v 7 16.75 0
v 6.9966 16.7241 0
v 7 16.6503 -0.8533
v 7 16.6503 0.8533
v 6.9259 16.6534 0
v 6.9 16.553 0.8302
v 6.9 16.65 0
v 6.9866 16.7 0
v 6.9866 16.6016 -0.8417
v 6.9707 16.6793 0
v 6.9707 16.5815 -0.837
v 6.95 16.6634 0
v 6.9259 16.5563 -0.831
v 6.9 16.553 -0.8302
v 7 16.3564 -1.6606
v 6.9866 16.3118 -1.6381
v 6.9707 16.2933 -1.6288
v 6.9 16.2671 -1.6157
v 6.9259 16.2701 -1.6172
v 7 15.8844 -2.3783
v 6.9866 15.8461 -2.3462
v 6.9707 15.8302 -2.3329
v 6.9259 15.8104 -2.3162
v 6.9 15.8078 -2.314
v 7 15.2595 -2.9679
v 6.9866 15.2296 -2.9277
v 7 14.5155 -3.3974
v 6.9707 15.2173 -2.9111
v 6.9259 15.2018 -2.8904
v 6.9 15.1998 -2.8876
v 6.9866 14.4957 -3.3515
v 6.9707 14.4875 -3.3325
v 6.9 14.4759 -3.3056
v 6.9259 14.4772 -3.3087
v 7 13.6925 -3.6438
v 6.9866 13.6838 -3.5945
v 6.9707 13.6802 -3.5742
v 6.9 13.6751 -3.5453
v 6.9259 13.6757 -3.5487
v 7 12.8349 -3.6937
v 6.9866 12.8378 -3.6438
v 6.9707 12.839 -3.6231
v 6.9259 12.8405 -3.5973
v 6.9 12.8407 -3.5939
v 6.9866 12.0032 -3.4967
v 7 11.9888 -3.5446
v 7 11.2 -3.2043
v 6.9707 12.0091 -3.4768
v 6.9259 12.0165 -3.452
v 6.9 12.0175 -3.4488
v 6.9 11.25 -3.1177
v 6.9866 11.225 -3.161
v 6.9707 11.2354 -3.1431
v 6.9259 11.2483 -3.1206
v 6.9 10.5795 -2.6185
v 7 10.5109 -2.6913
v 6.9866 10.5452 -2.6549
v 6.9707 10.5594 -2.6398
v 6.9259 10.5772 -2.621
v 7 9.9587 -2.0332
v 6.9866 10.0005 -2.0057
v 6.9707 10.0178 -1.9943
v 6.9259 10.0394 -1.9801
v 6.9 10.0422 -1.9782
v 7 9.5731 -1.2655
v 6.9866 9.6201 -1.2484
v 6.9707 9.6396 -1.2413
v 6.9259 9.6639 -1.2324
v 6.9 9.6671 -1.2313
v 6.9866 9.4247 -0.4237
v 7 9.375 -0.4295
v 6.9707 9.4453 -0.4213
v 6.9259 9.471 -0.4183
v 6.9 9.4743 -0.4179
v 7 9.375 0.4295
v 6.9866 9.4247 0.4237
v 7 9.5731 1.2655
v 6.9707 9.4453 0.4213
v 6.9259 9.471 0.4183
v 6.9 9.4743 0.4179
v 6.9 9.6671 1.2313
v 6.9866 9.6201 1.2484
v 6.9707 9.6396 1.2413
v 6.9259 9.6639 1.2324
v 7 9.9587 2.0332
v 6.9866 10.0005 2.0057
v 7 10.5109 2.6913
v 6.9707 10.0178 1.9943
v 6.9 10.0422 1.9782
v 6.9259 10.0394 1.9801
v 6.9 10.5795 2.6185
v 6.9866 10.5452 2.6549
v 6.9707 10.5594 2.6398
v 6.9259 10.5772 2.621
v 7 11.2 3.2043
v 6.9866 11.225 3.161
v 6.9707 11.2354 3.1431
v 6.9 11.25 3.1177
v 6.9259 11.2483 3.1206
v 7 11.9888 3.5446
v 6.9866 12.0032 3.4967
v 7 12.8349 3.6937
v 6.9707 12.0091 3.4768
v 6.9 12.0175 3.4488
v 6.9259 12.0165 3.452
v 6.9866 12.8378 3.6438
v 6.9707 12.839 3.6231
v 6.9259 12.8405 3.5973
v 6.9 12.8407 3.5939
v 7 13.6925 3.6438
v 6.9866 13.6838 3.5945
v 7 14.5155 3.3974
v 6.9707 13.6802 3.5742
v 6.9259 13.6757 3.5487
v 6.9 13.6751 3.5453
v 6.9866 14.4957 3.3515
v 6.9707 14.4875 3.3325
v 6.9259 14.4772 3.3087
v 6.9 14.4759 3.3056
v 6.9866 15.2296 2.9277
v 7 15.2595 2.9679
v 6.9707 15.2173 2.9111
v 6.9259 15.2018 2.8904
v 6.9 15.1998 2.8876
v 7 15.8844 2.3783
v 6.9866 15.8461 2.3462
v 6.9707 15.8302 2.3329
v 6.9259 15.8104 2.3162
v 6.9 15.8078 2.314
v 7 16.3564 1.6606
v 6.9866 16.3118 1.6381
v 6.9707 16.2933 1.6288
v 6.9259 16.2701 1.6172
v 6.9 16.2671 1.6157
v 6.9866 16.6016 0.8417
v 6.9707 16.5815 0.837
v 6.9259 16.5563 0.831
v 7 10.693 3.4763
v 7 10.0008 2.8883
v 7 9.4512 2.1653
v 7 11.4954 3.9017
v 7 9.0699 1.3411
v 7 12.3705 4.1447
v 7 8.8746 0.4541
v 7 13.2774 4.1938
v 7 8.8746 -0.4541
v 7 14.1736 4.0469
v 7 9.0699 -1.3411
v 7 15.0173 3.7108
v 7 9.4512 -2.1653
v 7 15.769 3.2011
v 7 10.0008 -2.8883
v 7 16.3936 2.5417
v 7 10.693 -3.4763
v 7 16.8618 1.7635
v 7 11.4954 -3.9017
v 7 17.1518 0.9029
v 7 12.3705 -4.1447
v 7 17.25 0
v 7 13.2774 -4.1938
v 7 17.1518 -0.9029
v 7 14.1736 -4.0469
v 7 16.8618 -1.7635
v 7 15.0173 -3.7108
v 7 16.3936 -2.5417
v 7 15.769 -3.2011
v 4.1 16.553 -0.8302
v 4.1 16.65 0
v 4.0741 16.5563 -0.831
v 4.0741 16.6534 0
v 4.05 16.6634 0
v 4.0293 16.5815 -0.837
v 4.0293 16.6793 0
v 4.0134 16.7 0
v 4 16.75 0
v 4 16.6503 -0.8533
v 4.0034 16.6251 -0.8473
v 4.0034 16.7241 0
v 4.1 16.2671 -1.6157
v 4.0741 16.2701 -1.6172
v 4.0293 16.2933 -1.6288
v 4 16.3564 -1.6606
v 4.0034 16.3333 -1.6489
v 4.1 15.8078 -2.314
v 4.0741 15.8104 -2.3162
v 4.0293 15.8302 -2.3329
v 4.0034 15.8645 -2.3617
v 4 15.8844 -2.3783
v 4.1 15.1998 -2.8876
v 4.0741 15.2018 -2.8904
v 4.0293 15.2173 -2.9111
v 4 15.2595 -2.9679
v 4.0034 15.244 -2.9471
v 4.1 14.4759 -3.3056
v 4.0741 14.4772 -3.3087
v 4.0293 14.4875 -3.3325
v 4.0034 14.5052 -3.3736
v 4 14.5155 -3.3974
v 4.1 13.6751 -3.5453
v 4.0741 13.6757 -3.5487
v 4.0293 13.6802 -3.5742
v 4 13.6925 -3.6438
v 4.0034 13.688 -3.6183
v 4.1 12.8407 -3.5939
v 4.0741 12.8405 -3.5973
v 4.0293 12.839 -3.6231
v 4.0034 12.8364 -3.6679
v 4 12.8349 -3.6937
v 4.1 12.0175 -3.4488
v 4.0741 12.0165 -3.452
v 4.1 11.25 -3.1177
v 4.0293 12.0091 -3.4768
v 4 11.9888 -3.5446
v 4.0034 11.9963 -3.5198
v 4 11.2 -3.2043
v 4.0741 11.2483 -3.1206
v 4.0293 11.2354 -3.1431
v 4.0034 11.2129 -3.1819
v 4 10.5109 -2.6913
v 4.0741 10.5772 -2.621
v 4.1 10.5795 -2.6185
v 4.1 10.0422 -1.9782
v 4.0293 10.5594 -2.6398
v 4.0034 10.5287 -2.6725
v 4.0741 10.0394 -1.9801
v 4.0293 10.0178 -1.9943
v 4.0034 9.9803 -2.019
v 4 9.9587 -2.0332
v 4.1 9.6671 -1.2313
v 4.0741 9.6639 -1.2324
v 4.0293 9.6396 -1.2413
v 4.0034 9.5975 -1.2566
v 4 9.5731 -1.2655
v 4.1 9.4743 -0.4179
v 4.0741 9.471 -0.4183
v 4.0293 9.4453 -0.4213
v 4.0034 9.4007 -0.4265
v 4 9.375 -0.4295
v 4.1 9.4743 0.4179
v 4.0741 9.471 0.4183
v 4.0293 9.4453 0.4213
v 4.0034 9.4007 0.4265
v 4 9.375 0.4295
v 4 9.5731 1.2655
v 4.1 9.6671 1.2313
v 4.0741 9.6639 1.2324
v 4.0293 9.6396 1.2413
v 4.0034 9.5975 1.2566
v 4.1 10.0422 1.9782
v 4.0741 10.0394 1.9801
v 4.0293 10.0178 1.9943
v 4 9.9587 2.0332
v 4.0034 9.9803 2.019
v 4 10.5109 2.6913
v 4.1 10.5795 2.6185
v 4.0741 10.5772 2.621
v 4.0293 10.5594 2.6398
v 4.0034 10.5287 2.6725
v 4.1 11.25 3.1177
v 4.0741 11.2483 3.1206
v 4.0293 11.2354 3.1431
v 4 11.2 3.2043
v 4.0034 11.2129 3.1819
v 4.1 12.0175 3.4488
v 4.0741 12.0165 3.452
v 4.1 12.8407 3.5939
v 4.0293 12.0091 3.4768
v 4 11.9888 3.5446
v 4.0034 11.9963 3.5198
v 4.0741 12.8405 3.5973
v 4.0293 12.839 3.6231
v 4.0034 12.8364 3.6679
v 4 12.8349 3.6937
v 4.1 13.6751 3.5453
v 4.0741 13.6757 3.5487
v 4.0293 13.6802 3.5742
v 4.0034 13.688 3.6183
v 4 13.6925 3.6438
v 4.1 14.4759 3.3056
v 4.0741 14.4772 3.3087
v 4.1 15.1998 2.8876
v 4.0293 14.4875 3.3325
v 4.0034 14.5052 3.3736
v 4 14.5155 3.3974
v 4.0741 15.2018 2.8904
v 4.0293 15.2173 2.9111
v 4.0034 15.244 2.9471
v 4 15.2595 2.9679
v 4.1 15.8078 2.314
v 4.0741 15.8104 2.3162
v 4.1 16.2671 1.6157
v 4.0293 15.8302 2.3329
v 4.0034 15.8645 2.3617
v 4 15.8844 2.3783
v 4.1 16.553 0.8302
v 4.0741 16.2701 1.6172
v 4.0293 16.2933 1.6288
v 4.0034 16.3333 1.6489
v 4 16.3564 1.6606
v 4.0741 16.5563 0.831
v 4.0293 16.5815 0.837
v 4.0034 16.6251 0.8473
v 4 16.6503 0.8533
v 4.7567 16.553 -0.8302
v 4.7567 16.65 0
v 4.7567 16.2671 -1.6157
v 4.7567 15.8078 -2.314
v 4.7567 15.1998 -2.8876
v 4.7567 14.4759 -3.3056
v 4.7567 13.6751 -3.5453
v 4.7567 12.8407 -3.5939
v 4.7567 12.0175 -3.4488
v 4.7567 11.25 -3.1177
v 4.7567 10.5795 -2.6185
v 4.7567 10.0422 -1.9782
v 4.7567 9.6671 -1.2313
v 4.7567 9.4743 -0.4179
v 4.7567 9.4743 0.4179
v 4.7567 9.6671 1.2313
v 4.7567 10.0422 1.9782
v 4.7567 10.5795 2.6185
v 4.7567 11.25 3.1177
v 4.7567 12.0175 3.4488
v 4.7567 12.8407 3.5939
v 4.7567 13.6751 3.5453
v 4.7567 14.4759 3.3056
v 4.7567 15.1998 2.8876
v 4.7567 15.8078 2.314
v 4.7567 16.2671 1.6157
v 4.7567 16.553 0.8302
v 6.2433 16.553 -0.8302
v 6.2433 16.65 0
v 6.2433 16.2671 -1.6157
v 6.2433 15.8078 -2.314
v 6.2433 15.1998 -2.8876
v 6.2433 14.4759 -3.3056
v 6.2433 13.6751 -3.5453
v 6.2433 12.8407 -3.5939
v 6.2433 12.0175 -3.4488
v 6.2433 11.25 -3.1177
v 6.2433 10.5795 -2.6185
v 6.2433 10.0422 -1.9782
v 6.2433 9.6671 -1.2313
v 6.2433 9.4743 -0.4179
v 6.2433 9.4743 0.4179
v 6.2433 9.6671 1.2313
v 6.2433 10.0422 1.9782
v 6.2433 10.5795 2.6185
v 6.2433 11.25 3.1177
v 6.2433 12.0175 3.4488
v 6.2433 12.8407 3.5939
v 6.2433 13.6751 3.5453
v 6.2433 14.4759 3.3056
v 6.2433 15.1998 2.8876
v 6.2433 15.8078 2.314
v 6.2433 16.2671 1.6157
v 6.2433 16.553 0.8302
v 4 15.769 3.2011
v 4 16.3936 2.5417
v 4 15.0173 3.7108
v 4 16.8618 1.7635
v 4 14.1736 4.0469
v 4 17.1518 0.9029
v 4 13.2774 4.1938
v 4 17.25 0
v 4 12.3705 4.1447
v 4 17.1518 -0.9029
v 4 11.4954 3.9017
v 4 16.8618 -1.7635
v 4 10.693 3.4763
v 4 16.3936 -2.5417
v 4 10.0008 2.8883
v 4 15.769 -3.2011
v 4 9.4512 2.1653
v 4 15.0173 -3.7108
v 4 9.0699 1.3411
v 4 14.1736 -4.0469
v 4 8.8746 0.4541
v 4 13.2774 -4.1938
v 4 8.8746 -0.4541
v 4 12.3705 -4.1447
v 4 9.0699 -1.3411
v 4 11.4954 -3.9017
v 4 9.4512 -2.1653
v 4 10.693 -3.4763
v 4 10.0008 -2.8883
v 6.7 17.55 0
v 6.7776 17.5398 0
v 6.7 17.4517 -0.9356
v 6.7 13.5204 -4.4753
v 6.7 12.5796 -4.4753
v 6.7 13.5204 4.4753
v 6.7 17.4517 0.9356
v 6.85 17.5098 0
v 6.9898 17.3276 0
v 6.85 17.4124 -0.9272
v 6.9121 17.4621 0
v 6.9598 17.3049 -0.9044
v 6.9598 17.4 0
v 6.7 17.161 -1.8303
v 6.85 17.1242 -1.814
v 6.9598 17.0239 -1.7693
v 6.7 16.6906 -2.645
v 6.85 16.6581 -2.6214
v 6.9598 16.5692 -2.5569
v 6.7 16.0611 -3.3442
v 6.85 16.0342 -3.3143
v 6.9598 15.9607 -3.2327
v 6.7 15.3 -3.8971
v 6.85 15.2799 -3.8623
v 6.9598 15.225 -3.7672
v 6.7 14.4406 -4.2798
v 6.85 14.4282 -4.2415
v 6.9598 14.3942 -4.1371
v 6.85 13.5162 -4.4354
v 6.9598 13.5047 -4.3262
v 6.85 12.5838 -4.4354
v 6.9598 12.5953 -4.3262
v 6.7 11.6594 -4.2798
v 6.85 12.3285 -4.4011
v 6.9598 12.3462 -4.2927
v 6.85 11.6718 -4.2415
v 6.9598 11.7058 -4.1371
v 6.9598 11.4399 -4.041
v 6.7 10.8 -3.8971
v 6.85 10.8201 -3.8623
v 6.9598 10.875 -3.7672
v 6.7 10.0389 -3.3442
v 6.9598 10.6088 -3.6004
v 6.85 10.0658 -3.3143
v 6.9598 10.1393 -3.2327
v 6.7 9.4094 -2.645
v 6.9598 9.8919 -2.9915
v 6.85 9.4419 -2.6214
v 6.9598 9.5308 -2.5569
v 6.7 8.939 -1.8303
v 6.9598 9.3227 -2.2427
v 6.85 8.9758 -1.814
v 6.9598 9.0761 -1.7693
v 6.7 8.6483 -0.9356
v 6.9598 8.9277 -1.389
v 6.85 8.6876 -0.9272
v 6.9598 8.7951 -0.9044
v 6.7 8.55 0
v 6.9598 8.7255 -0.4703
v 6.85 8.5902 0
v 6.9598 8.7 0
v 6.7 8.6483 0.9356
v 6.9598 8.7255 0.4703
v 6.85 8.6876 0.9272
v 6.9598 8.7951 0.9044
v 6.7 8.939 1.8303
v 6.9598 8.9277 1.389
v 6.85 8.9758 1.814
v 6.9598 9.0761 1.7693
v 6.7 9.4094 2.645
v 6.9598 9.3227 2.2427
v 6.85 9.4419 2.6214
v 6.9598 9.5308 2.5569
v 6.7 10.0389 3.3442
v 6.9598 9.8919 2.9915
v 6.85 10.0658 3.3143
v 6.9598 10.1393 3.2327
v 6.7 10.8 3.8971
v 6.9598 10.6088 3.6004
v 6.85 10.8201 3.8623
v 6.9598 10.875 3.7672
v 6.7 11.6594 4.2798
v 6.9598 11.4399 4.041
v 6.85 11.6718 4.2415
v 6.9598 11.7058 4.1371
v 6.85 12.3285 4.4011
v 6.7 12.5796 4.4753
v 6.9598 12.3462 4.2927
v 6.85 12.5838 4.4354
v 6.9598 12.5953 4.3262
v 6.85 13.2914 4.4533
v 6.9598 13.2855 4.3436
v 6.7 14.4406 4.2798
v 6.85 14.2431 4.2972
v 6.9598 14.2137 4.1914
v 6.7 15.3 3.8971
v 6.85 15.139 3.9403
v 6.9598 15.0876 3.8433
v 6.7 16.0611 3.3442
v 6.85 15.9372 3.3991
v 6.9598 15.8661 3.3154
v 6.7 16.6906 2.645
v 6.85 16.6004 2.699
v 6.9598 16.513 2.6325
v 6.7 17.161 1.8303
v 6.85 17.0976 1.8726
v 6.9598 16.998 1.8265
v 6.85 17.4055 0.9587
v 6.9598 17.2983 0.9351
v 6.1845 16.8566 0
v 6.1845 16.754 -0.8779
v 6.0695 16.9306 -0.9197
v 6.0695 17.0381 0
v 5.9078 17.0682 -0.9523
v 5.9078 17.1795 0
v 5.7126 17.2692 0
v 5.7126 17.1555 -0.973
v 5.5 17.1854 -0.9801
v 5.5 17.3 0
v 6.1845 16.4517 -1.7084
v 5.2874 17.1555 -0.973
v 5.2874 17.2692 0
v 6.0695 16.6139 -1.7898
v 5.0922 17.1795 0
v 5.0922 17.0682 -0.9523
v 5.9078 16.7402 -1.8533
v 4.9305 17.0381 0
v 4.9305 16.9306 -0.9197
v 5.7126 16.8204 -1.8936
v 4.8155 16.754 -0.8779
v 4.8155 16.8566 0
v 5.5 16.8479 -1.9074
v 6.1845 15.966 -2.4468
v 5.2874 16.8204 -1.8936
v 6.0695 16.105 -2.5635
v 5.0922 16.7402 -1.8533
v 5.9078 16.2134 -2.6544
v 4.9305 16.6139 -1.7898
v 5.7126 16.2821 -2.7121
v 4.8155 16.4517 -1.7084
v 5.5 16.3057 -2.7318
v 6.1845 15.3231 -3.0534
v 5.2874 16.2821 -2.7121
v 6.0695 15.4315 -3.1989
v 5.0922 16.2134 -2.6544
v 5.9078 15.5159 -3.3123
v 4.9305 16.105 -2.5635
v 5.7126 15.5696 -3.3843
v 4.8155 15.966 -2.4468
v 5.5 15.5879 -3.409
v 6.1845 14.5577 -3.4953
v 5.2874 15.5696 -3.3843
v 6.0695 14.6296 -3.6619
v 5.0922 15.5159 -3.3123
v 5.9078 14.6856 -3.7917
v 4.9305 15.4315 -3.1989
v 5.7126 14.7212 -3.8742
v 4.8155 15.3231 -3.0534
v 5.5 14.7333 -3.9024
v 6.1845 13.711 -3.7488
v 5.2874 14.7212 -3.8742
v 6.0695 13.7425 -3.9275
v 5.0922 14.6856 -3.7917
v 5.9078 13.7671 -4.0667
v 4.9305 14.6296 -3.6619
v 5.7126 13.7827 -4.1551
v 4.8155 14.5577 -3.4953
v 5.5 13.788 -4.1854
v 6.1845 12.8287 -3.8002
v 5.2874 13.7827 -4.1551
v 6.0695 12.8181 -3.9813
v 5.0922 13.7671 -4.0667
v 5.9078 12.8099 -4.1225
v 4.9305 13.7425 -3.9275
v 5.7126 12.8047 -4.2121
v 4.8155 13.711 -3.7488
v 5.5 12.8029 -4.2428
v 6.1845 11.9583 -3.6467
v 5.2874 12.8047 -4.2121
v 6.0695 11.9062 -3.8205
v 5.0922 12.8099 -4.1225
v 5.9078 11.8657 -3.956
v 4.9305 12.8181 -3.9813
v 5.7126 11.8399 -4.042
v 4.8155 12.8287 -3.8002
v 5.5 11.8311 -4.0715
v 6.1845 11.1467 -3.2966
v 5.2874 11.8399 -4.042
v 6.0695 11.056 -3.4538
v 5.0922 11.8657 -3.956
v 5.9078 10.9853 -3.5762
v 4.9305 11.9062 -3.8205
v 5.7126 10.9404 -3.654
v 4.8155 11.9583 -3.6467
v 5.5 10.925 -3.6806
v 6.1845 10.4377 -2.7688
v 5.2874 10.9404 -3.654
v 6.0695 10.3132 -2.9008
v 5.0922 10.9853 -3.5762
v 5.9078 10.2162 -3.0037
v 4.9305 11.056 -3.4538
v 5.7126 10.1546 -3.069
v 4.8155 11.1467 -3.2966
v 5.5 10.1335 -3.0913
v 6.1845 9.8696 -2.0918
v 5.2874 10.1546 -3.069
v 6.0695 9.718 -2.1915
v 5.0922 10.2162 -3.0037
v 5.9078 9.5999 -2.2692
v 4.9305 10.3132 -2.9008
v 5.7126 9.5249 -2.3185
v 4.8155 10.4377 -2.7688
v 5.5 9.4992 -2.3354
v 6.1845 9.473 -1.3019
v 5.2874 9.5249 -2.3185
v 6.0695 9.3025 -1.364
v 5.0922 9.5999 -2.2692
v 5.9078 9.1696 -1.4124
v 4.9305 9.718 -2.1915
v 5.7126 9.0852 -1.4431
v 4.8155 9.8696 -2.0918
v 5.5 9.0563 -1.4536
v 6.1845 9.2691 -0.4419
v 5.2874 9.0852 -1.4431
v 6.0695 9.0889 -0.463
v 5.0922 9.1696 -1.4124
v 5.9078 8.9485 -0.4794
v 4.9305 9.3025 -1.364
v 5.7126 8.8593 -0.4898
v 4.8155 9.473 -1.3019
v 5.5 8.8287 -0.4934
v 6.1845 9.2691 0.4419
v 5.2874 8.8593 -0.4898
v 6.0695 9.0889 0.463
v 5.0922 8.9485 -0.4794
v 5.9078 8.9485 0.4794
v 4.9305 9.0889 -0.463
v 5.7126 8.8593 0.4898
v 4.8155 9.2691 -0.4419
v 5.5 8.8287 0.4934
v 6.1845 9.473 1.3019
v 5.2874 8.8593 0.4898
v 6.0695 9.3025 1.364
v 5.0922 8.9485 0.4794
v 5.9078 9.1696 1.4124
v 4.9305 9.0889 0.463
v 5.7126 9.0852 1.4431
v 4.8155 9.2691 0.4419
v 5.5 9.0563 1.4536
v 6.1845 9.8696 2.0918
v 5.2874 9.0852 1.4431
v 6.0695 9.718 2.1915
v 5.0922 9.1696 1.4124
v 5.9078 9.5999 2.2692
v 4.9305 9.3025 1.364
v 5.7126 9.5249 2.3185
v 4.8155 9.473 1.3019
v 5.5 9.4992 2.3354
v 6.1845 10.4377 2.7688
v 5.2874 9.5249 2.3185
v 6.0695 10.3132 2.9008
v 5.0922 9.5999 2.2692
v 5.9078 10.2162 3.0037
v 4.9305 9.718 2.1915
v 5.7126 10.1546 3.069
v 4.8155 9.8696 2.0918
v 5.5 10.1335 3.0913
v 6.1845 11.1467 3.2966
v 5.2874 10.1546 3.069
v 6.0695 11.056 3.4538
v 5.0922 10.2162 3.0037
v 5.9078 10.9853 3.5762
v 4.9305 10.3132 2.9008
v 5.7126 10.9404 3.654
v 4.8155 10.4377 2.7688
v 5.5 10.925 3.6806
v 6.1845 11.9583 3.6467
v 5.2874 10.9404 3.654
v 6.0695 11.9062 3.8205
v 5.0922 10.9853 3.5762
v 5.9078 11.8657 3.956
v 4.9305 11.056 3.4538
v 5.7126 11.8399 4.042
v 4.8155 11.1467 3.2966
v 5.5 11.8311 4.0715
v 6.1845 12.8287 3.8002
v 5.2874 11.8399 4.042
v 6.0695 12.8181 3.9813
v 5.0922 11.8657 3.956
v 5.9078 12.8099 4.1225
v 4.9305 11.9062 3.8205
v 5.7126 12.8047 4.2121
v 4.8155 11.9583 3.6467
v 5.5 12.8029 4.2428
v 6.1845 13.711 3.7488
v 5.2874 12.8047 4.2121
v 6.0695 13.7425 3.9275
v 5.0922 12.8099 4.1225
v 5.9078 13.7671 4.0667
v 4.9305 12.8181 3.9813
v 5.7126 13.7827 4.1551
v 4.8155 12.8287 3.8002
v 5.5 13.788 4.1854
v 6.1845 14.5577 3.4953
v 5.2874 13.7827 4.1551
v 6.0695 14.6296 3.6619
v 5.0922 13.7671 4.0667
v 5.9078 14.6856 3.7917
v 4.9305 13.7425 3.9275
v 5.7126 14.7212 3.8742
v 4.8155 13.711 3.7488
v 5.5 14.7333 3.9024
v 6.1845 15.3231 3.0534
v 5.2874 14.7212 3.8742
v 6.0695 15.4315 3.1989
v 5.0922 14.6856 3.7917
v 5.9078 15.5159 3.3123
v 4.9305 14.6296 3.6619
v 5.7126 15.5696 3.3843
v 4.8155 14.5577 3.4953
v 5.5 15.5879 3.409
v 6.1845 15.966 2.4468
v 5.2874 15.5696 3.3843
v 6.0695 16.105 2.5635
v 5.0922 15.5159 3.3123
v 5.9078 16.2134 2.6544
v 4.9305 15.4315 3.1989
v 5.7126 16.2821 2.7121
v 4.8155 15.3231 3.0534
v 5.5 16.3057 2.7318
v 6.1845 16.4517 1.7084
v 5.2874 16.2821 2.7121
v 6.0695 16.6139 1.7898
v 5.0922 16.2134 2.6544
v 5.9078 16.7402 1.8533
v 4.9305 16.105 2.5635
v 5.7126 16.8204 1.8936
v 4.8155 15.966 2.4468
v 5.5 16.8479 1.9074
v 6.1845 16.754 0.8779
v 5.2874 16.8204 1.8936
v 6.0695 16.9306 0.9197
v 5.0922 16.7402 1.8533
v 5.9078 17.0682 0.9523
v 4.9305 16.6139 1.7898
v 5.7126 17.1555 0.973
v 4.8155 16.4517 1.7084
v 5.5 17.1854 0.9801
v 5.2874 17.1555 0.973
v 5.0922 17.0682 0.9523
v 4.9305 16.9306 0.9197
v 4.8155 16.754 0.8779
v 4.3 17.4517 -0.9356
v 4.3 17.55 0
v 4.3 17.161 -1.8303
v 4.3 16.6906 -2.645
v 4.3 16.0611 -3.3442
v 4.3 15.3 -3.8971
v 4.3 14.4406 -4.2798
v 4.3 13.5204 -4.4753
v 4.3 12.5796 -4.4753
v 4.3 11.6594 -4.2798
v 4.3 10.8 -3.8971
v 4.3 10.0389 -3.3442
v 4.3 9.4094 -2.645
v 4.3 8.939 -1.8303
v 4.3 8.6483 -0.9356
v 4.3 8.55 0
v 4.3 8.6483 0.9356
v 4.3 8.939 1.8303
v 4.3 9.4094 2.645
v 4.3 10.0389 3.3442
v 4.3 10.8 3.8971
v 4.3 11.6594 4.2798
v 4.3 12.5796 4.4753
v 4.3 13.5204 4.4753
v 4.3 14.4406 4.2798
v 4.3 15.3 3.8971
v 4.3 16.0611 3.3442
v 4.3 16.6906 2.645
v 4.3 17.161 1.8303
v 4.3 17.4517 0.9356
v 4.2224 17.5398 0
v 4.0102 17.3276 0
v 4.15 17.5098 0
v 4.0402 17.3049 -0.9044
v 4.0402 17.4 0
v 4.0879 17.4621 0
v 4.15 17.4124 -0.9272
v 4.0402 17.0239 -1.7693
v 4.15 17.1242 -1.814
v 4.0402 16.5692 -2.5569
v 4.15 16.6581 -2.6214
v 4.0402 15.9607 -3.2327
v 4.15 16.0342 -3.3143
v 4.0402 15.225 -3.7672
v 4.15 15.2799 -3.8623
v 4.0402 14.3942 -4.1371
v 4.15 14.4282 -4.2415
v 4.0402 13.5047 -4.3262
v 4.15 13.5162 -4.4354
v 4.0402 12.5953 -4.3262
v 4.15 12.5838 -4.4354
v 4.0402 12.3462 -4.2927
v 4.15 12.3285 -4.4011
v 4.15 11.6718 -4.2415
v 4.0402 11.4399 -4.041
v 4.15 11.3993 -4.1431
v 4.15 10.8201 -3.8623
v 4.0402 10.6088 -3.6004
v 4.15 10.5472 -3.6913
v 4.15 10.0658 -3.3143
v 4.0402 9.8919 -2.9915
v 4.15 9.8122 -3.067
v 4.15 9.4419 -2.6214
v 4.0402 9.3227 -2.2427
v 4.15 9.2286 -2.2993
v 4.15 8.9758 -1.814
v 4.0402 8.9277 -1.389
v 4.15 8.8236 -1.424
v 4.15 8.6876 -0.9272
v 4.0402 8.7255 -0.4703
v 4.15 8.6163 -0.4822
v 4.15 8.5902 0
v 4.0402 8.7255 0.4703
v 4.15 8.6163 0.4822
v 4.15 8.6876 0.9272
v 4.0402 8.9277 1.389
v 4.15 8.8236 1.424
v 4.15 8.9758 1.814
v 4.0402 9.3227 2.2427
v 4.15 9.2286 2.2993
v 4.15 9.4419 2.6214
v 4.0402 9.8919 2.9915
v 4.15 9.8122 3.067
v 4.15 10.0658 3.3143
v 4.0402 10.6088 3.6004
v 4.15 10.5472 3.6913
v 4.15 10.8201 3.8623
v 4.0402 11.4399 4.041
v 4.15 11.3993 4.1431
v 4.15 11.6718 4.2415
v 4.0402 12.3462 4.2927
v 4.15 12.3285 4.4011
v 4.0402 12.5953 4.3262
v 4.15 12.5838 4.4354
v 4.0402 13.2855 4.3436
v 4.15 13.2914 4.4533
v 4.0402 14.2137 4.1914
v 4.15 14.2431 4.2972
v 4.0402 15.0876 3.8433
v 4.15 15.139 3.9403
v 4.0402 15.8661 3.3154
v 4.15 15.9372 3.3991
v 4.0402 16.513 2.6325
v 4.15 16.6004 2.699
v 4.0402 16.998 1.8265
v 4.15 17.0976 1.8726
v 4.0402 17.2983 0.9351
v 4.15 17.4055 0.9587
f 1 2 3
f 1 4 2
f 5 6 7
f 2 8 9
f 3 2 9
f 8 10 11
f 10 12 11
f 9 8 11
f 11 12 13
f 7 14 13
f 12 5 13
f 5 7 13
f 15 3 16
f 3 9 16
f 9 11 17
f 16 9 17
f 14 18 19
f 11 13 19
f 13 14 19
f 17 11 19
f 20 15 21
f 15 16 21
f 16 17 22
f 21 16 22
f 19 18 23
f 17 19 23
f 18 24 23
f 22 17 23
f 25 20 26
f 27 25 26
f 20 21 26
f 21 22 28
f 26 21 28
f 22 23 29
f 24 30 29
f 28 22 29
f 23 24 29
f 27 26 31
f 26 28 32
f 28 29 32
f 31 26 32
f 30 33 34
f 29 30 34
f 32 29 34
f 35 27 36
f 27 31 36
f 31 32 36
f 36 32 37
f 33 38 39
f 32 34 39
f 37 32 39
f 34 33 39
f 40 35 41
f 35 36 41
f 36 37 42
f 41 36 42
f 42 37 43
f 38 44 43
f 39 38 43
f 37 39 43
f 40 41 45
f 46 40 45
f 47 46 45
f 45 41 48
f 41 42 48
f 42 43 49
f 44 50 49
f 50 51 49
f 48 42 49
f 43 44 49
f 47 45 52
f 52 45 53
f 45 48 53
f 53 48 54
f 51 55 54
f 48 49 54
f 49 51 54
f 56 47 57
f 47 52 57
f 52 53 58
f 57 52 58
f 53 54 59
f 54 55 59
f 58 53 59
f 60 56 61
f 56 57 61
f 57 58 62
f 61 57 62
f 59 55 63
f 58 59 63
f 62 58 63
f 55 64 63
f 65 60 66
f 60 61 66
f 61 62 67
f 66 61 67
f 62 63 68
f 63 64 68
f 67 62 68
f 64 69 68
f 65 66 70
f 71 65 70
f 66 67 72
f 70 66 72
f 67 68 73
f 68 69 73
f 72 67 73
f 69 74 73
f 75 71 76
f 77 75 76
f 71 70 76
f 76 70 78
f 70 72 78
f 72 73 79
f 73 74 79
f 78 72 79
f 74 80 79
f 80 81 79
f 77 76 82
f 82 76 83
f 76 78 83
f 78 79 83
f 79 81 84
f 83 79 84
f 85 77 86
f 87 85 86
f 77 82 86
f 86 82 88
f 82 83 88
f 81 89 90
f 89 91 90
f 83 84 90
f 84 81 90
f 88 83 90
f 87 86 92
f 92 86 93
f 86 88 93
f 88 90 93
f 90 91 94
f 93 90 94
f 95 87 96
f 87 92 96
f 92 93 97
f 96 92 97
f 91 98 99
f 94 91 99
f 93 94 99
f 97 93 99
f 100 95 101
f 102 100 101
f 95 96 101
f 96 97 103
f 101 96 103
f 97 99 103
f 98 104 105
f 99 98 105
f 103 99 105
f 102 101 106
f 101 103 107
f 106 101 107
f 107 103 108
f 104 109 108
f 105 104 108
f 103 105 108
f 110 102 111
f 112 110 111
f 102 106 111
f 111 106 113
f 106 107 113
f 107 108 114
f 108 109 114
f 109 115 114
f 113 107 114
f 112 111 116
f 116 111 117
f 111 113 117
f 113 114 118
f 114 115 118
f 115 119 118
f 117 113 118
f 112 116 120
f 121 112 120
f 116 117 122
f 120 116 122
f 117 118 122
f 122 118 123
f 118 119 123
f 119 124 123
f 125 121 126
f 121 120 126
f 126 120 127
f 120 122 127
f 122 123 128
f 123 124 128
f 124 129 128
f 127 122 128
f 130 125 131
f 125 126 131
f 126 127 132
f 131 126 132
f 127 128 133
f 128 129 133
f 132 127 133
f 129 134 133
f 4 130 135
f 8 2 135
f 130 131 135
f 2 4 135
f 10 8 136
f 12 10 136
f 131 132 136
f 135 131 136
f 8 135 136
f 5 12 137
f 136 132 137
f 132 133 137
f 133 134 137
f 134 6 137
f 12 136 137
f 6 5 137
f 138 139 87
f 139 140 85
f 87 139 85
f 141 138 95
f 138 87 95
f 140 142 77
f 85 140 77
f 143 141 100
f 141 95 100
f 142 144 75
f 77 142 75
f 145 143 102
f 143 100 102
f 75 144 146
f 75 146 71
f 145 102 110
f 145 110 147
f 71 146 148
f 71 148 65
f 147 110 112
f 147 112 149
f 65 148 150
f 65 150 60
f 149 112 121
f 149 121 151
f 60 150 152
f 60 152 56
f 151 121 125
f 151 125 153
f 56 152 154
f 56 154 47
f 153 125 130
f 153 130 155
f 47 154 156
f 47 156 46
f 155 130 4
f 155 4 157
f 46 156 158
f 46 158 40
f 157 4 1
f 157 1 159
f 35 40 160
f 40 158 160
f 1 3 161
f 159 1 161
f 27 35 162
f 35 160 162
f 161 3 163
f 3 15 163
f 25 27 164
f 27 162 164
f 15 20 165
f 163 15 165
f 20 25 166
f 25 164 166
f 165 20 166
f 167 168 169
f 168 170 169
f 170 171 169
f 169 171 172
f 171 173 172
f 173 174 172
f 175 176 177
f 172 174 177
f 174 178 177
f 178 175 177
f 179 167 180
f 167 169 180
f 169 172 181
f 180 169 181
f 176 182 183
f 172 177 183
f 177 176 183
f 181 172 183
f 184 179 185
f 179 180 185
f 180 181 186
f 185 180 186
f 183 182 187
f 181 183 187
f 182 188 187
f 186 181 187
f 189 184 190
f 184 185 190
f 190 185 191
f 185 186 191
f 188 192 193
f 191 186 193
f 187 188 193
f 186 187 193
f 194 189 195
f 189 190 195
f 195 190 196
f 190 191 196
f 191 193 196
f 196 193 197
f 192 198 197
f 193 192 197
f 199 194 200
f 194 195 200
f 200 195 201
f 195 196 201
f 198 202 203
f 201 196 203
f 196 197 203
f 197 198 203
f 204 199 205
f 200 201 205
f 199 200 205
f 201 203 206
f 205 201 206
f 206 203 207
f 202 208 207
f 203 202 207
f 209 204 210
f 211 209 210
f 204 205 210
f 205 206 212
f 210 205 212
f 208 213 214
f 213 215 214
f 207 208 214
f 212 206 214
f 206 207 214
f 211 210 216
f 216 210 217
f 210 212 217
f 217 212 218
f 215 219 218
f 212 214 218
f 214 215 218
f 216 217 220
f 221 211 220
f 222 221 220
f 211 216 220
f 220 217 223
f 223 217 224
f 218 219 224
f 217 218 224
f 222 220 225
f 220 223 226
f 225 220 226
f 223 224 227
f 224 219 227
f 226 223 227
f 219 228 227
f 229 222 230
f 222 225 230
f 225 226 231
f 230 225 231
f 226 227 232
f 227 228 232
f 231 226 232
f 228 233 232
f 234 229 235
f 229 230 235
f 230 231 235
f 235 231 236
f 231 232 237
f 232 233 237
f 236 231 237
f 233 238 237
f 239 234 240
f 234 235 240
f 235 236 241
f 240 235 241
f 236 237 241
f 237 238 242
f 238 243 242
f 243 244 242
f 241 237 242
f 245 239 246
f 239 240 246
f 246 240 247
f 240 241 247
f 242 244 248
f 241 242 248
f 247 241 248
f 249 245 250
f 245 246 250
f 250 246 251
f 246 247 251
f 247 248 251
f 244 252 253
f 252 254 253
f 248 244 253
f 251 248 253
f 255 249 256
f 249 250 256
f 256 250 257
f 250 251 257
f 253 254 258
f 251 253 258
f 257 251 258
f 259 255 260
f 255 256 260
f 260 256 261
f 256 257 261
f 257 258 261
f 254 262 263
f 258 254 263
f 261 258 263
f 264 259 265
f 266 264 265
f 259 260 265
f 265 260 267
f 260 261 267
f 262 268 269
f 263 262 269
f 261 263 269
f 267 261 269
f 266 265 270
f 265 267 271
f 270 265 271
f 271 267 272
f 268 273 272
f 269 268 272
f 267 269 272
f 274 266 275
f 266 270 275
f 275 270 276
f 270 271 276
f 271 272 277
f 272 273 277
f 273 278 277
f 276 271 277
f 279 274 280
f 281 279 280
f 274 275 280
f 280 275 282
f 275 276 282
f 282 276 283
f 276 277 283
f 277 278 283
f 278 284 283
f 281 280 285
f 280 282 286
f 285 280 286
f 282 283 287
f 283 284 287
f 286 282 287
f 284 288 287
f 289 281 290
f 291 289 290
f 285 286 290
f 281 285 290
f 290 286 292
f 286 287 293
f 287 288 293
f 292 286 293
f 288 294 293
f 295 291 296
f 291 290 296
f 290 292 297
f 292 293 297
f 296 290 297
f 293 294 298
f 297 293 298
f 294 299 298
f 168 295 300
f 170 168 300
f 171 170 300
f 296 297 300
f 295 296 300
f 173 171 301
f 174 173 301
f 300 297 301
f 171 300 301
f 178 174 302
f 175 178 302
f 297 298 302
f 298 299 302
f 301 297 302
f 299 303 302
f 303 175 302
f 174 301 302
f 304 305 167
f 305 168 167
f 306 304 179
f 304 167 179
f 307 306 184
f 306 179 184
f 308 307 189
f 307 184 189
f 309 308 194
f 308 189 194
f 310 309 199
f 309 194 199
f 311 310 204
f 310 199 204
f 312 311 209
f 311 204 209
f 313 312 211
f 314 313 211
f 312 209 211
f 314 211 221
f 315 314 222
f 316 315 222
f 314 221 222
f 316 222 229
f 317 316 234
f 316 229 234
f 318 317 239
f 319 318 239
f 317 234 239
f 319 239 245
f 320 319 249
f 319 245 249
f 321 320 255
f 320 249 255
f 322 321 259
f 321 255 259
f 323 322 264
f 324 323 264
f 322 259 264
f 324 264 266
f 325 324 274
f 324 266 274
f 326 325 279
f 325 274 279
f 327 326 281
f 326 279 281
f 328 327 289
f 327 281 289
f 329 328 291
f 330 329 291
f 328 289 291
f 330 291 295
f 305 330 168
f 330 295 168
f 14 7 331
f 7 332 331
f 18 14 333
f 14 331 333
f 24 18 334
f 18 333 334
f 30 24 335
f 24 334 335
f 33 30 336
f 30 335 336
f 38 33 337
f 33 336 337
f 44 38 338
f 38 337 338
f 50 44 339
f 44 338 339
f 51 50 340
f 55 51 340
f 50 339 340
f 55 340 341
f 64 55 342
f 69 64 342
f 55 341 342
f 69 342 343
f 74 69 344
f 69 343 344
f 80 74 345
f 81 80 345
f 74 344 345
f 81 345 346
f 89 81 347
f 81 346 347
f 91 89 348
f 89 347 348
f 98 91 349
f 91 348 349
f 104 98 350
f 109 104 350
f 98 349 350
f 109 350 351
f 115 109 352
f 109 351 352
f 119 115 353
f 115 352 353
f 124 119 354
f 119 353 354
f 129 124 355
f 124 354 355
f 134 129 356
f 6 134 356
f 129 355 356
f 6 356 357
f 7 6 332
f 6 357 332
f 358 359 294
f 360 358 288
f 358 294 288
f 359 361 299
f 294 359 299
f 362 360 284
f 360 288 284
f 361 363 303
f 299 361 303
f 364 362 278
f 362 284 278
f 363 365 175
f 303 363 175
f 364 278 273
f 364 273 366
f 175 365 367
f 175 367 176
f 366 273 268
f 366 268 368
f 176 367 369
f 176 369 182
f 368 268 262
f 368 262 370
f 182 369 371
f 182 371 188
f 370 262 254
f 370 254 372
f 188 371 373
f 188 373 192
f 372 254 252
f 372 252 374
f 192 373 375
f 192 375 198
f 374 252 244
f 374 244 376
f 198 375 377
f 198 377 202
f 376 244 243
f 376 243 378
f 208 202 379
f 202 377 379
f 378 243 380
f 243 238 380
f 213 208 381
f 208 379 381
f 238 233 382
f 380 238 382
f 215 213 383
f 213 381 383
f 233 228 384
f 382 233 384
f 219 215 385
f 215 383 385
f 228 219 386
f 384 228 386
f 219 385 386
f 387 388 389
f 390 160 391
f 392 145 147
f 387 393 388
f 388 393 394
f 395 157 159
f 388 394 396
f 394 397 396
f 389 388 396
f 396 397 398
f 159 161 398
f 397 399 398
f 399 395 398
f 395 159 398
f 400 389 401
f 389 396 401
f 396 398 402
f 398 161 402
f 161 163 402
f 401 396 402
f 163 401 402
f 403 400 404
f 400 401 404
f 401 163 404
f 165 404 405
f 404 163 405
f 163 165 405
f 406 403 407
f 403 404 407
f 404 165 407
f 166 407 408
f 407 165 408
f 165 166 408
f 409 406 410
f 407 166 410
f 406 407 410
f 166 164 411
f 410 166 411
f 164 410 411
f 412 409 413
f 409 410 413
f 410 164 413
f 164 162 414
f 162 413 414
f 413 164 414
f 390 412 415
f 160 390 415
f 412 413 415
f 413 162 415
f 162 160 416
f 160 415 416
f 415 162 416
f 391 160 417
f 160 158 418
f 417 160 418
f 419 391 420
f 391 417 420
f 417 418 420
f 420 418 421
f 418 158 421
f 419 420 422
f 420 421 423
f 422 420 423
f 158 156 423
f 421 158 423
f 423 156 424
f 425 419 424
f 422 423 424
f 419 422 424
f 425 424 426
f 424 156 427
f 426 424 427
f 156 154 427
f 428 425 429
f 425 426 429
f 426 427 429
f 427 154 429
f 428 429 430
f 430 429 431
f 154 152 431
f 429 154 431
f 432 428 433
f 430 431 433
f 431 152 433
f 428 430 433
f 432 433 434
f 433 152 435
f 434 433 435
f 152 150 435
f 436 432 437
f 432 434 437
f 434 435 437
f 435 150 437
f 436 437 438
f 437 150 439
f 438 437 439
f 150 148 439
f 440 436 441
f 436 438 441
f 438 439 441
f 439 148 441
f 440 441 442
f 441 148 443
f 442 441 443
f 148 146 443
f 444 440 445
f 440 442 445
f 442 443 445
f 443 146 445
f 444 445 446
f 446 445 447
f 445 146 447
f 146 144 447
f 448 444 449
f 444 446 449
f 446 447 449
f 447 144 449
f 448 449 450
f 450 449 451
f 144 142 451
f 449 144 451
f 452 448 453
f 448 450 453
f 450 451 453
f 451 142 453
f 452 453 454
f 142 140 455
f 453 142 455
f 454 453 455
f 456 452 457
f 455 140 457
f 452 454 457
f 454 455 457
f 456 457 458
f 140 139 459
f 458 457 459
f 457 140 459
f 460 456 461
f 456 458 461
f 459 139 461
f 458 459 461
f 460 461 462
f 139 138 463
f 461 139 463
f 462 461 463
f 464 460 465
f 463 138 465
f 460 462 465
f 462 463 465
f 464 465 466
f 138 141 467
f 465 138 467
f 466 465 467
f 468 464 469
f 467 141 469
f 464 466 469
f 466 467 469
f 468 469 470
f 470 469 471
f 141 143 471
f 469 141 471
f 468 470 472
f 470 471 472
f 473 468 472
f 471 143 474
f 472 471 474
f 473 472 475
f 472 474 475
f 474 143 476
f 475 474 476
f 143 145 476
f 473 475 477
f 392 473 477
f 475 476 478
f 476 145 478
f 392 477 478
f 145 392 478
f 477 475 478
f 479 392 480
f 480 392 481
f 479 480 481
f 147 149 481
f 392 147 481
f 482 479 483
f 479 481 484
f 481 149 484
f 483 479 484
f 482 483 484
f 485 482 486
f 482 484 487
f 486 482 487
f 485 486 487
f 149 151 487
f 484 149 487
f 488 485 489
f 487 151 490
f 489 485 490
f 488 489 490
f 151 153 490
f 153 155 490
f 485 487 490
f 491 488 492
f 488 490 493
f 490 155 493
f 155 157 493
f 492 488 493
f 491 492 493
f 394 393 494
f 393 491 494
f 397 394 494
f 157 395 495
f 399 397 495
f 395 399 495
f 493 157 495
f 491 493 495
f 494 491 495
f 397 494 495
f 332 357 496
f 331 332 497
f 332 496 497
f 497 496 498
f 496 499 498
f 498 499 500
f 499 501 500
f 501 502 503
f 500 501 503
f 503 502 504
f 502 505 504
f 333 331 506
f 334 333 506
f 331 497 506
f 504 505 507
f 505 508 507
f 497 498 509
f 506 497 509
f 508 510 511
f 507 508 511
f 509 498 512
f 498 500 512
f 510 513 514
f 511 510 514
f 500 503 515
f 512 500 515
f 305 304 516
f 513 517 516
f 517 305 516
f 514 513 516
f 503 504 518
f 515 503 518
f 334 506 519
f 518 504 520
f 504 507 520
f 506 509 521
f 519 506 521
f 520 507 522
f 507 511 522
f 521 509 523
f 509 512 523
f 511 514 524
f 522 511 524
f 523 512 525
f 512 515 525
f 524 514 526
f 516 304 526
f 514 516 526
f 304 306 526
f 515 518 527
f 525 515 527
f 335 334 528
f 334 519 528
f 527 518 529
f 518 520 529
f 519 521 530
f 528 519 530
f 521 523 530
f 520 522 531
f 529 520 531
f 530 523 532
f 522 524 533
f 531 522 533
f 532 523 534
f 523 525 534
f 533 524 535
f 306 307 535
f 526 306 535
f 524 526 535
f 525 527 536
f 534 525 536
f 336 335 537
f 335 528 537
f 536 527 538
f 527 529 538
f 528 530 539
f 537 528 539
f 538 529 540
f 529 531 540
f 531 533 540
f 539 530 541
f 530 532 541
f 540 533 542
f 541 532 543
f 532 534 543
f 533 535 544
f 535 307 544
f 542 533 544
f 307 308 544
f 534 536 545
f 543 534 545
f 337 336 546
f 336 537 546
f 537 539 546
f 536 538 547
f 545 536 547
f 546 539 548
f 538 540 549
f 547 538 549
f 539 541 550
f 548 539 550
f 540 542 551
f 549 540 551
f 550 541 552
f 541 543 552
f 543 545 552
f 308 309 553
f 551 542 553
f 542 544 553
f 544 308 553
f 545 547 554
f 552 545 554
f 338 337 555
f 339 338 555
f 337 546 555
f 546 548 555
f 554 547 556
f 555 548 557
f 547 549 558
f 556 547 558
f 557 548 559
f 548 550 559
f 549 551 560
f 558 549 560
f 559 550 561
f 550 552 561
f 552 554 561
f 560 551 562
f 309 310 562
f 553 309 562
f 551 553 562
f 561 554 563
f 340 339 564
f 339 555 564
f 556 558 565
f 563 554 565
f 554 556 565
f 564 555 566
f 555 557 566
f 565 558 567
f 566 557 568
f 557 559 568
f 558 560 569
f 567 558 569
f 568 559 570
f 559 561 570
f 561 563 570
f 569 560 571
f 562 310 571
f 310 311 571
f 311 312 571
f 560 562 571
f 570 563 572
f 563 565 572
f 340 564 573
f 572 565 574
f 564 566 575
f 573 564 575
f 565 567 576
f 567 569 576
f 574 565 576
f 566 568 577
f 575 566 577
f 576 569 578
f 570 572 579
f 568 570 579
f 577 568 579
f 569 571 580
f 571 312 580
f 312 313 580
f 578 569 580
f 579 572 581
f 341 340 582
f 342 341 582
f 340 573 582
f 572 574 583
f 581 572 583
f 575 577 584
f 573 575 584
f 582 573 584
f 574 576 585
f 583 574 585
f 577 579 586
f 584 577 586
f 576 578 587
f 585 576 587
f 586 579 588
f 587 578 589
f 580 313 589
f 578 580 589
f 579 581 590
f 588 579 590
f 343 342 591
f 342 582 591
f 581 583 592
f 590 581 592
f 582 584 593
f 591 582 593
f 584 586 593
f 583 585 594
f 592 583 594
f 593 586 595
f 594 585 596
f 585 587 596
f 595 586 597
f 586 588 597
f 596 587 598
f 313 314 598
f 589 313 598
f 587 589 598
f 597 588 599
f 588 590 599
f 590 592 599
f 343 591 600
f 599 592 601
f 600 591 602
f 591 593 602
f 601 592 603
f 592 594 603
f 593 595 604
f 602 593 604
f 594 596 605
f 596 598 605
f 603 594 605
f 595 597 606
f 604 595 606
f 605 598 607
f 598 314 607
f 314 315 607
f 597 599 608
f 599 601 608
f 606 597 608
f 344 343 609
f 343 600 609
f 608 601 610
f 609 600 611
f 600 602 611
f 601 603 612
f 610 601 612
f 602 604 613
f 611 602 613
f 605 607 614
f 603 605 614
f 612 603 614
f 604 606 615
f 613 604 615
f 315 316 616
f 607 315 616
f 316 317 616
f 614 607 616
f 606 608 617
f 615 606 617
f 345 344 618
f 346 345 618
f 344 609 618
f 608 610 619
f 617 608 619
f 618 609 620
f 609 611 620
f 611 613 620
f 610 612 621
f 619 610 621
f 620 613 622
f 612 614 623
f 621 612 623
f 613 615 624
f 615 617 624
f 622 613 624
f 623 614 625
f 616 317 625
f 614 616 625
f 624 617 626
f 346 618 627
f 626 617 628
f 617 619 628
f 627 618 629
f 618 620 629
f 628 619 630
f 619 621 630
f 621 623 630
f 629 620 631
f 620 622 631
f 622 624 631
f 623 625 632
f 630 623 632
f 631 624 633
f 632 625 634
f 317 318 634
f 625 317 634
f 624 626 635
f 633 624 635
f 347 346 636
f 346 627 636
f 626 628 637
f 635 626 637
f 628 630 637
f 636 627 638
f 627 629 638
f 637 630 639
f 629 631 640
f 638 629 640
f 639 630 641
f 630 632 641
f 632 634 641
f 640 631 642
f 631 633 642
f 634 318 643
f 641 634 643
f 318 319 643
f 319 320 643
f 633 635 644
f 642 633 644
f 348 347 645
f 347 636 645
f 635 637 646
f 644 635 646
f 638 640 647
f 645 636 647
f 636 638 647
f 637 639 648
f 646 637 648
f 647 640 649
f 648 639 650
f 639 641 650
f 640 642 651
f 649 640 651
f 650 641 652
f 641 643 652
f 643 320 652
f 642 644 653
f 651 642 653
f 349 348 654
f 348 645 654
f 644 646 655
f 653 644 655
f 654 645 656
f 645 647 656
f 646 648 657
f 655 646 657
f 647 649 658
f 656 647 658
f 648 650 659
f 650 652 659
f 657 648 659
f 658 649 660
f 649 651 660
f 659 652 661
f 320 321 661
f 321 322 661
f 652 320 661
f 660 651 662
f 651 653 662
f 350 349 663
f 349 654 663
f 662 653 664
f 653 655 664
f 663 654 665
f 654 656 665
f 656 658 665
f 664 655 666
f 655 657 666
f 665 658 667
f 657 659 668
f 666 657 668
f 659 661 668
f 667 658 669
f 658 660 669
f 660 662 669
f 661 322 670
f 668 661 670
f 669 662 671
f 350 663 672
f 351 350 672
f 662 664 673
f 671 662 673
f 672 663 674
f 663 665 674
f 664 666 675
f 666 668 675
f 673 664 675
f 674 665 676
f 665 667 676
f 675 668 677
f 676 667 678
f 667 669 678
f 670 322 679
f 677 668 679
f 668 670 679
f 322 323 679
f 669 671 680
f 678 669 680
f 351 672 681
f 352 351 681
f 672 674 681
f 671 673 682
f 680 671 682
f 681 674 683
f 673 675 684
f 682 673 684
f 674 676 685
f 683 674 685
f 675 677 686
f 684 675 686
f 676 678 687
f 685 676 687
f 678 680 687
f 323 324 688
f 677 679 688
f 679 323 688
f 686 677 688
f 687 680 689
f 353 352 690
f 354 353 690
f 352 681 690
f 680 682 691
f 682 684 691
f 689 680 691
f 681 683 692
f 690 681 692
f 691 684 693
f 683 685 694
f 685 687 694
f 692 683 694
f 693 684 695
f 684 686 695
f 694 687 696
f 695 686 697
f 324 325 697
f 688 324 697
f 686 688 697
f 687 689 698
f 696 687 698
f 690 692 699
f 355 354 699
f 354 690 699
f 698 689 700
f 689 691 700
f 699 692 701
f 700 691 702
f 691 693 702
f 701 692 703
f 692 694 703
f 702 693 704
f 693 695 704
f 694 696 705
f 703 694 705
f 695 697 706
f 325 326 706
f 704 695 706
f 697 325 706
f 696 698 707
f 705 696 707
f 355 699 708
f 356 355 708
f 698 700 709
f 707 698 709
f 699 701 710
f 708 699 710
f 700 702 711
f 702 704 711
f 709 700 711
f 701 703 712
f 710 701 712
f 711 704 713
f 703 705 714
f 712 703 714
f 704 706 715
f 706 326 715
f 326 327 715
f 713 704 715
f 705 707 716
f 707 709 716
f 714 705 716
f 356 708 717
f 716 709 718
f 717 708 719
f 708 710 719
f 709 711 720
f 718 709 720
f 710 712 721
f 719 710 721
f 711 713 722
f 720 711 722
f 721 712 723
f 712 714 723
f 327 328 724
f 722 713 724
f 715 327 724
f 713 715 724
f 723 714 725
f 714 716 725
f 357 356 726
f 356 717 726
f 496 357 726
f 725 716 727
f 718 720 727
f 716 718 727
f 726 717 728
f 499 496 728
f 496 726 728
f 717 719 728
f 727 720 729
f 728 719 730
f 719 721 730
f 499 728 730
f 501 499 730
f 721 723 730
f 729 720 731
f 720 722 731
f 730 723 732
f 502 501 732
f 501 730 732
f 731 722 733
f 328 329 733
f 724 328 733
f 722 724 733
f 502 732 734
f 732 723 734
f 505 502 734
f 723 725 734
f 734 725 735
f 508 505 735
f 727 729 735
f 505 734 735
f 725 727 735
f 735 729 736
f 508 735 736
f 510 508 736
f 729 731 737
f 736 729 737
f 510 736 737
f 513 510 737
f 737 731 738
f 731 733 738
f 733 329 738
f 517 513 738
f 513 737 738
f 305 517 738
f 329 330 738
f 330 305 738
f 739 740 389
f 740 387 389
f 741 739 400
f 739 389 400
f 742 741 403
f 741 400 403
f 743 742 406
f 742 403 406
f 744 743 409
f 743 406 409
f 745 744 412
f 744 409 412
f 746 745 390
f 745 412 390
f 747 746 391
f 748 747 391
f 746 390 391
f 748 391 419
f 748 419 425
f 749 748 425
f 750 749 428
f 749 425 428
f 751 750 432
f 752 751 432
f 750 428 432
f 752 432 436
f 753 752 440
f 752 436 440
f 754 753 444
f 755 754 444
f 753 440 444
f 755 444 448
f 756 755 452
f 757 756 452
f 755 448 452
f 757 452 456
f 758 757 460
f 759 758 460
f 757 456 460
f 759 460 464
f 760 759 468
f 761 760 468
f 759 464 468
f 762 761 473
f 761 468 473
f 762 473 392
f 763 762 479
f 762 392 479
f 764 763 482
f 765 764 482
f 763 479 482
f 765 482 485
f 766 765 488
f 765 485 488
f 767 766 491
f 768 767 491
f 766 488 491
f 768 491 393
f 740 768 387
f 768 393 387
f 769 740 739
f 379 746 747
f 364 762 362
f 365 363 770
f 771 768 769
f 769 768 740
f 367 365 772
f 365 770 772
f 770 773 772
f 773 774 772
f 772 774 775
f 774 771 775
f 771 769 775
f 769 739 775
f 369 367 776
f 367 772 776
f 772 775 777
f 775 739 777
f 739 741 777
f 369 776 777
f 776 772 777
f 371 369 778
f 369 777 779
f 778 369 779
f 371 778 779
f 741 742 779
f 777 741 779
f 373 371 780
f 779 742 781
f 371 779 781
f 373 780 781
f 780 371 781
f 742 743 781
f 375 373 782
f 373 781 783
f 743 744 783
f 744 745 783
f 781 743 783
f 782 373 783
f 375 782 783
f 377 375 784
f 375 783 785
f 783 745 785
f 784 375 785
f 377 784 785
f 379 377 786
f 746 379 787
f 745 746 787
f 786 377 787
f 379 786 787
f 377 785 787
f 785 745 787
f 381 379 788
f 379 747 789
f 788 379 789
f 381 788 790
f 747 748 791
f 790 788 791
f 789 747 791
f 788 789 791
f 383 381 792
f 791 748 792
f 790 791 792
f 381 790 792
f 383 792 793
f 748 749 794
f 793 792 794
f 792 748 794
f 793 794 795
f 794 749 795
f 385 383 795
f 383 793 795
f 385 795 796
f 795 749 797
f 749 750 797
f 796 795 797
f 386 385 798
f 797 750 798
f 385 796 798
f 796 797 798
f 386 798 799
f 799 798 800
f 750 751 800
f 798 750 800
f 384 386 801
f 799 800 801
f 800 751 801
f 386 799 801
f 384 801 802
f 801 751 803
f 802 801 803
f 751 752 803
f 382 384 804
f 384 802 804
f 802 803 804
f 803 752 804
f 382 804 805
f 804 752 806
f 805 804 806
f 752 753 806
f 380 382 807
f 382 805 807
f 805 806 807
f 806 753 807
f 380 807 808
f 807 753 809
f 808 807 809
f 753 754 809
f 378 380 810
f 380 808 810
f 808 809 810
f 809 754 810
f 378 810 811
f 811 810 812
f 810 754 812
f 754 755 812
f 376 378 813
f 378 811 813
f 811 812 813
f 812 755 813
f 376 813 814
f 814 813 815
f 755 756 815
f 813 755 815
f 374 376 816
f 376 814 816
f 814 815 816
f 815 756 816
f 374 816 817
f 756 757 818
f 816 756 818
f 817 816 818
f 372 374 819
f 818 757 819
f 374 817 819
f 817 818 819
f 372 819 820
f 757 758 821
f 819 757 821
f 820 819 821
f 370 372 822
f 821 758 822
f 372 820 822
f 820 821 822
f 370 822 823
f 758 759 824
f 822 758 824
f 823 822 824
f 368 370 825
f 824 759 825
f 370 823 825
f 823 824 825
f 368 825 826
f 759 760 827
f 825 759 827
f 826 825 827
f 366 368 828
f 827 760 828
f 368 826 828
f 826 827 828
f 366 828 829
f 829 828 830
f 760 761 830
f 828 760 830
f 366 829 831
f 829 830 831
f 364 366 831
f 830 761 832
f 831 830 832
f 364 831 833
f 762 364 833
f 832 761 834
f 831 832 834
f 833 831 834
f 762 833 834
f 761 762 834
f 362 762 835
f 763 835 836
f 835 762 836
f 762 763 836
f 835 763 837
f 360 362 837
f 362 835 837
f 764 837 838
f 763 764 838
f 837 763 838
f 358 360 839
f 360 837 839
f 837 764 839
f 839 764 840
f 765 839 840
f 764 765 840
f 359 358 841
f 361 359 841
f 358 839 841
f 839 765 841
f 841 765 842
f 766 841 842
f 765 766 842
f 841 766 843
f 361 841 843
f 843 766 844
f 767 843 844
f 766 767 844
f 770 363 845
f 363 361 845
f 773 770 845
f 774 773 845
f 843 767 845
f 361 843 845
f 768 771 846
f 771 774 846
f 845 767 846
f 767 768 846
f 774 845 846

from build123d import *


with BuildPart() as part:
    # Sketch1 → Revolve1 (revolve)
    with BuildSketch(Plane(origin=(0, 0, 0), x_dir=(-1, 0, 0), z_dir=(0, 0, -1))):
        with BuildLine():
            Line((-6.9, 16.65), (-6.243303437, 16.65))
            ThreePointArc((-6.243303437, 16.65), (-5.5, 17.3), (-4.756696563, 16.65))
            Line((-4.756696563, 16.65), (-4.1, 16.65))
            ThreePointArc((-4.1, 16.65), (-4.029289322, 16.679289322), (-4, 16.75))
            Line((-4, 16.75), (-4, 17.25))
            ThreePointArc((-4, 17.25), (-4.087867966, 17.462132034), (-4.3, 17.55))
            Line((-4.3, 17.55), (-6.7, 17.55))
            ThreePointArc((-6.7, 17.55), (-6.912132034, 17.462132034), (-7, 17.25))
            Line((-7, 17.25), (-7, 16.75))
            ThreePointArc((-7, 16.75), (-6.970710678, 16.679289322), (-6.9, 16.65))
        make_face()
    revolve(axis=Axis((8.051399781, 13.05, 0), (-1, 0, 0)))


solid = part.part
